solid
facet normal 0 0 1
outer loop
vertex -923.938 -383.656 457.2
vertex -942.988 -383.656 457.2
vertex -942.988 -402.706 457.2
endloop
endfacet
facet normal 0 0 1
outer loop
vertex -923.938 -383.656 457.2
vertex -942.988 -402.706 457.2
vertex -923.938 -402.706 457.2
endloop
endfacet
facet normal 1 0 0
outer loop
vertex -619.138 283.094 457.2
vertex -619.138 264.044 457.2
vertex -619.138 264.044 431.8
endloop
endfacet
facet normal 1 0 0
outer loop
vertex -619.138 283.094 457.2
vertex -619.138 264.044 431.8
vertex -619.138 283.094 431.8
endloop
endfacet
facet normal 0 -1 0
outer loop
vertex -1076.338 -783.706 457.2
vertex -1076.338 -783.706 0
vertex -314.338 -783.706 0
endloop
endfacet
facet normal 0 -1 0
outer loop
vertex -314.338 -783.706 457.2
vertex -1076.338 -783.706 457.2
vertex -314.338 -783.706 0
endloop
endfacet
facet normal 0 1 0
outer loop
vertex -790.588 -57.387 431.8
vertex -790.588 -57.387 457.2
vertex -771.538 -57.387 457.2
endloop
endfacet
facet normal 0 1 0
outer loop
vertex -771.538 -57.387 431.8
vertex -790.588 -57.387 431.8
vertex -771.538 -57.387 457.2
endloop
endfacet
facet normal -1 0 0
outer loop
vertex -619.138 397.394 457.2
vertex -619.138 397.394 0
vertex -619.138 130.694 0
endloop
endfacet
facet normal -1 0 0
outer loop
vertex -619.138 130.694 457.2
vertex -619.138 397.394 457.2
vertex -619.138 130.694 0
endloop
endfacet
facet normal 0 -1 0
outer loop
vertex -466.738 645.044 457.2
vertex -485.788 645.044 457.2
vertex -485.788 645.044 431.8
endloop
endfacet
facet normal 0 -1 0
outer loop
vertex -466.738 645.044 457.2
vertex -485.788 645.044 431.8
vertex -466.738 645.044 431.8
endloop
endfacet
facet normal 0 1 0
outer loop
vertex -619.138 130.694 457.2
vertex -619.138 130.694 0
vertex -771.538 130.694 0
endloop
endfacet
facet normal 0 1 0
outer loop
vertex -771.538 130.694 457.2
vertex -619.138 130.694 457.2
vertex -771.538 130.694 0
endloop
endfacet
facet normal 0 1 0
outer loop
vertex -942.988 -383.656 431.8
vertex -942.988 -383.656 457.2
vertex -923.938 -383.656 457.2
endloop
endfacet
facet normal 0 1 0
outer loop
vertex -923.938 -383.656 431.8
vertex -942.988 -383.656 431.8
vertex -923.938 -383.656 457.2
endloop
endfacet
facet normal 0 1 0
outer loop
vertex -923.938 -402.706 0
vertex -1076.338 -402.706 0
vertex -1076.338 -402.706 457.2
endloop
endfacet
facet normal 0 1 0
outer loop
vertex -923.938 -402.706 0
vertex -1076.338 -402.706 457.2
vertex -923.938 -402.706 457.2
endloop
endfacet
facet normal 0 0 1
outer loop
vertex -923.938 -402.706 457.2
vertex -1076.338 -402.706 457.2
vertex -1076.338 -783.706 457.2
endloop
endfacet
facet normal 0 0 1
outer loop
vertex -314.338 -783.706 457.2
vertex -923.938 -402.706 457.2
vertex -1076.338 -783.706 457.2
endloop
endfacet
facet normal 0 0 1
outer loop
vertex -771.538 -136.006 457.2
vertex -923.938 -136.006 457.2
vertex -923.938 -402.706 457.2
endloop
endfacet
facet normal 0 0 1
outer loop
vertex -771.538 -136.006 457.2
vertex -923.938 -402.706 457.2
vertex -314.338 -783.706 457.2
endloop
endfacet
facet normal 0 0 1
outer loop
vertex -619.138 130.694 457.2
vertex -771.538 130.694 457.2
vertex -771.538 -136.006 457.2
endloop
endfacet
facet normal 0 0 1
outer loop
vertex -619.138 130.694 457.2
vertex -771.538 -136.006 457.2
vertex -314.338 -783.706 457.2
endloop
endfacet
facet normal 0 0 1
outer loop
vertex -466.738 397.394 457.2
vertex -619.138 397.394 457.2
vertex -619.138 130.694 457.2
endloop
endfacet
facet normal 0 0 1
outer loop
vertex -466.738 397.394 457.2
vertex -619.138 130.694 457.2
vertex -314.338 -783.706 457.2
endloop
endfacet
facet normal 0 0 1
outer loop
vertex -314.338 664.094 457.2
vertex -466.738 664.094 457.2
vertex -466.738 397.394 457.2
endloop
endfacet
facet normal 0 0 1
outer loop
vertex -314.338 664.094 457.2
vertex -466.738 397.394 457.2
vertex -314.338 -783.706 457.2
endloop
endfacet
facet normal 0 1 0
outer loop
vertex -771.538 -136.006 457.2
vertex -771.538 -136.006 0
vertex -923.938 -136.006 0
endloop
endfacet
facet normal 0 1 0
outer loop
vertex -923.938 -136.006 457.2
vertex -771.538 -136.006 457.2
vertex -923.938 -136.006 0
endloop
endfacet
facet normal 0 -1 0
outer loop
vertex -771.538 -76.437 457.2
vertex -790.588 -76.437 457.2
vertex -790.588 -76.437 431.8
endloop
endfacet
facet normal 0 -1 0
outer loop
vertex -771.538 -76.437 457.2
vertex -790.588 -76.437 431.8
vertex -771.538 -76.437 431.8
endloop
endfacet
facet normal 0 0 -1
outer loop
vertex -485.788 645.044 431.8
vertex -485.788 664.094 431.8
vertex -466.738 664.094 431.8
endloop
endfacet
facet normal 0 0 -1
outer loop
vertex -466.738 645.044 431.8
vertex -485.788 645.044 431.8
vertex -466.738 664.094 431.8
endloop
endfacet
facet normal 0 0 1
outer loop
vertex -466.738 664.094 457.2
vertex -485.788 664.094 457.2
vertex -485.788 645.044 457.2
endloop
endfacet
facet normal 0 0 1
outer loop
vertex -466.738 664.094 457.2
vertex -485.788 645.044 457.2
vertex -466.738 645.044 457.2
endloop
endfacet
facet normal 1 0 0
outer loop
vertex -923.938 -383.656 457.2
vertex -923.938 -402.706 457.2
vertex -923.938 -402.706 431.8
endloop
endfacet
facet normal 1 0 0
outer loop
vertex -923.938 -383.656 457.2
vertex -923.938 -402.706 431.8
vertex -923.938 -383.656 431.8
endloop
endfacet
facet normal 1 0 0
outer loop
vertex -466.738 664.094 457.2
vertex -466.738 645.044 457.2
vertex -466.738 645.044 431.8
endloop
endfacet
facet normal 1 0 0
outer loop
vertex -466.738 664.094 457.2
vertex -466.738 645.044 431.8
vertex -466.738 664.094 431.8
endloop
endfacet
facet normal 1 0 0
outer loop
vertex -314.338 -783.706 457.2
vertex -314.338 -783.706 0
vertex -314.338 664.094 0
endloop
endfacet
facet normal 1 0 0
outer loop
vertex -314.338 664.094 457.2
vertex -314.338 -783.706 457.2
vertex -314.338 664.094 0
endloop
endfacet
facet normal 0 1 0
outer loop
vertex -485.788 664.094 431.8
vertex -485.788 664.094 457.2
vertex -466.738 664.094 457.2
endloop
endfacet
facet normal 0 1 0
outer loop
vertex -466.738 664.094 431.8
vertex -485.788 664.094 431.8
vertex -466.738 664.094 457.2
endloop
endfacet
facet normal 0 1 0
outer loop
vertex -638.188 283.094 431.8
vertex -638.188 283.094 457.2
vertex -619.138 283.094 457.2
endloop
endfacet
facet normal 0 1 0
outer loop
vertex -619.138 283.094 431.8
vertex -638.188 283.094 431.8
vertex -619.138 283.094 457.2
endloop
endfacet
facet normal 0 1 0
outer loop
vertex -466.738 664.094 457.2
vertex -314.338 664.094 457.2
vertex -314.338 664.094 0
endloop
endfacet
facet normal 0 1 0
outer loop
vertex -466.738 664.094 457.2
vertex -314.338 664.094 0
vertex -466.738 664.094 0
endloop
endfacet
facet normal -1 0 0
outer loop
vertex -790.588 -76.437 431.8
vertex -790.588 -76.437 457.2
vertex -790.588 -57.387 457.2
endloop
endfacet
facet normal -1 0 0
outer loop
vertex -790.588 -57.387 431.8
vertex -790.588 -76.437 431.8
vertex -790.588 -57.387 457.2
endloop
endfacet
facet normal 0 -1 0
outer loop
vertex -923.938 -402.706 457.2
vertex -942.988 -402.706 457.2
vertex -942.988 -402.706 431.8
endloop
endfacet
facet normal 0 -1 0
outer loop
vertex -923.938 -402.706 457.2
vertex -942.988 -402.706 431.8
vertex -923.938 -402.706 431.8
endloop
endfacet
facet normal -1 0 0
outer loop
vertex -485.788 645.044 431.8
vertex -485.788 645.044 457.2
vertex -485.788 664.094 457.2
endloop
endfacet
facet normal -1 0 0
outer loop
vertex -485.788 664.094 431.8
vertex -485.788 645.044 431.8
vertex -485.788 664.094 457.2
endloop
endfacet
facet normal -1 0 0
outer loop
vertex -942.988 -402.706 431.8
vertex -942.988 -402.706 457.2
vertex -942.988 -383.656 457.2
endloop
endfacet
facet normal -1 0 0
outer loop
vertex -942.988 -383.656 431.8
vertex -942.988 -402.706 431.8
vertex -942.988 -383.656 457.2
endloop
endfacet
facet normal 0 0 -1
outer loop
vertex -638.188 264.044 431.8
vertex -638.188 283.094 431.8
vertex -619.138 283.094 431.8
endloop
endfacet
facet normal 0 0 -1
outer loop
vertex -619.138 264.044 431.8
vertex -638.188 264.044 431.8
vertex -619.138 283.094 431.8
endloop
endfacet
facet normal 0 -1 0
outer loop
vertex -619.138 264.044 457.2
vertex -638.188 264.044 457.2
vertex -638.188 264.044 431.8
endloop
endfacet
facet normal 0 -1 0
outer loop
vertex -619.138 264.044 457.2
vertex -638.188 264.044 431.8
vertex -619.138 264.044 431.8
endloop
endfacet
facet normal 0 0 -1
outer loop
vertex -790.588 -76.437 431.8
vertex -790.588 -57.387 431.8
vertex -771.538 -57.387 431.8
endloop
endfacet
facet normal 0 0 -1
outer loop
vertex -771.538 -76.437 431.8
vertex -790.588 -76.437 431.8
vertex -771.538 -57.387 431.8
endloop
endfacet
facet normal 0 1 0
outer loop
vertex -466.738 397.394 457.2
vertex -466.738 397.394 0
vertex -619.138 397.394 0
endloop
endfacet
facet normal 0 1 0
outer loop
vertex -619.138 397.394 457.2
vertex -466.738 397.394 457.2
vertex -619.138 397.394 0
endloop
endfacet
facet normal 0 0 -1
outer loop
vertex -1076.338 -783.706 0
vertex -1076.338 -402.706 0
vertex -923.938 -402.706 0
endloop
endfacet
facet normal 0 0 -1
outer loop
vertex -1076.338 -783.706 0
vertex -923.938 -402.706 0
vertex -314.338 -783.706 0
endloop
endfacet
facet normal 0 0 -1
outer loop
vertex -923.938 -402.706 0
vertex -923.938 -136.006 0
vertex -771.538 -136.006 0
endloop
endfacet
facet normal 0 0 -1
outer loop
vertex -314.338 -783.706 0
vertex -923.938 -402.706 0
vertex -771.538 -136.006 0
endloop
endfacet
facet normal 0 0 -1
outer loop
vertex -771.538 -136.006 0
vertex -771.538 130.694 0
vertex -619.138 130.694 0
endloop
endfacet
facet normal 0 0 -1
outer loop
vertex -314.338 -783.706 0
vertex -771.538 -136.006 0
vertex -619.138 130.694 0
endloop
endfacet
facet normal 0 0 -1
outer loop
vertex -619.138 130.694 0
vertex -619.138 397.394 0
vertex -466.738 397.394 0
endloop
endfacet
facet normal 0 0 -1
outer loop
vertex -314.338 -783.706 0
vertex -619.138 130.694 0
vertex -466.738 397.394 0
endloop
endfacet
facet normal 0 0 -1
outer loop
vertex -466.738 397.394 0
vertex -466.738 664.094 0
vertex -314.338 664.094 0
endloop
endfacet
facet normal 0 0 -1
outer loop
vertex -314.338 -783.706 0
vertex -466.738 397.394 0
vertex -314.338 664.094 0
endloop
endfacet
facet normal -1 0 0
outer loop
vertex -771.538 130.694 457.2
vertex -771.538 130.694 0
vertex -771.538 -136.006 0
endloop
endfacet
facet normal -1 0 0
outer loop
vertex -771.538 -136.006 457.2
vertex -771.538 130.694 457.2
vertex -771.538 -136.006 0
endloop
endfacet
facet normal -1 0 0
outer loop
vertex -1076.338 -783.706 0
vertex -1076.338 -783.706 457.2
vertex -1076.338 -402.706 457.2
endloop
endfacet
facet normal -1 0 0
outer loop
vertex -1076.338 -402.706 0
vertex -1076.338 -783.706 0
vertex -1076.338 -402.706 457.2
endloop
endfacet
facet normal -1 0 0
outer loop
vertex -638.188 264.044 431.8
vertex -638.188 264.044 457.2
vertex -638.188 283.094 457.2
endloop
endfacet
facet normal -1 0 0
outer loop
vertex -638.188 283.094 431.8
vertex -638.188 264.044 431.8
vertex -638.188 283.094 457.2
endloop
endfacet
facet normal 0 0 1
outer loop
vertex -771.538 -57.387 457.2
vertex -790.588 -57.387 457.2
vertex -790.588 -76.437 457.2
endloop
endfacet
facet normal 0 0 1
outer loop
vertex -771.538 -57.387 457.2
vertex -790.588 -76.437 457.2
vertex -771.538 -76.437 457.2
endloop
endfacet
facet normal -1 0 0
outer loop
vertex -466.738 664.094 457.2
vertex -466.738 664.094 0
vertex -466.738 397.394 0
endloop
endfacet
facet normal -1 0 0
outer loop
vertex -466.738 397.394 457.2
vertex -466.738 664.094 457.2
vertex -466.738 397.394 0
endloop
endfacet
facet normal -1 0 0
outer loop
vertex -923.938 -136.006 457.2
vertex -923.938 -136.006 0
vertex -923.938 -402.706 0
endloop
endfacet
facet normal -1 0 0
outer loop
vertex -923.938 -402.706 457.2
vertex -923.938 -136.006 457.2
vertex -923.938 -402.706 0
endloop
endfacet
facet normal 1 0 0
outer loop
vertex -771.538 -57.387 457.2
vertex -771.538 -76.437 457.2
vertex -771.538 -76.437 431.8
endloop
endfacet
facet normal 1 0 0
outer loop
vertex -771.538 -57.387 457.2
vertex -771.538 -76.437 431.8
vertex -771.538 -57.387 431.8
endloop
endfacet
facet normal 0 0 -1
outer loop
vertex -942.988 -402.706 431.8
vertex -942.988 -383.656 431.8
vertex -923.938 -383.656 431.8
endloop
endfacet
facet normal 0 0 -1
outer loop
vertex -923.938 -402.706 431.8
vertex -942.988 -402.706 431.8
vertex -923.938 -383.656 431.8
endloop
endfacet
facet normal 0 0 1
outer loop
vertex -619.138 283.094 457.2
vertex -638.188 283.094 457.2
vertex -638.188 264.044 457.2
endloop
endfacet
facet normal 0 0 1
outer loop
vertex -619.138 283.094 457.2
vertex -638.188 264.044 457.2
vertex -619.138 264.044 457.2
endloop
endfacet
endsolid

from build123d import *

# Parameters (mm, degrees)
F0_W     = 152.4
F0_H     = 381
F1_DEPTH = 457.2
F2_W     = 19.05
F2_H     = 19.05
F3_DEPTH = 25.4


with BuildPart() as f1:
    # F0 (on Top) → F1 (new body)
    with BuildSketch(Plane.XY):
        Polygon((-466.7380232334, 397.3943232992), (-466.7380232334, -783.7056767008), (-314.3380232334, -783.7056767008), (-314.3380232334, 664.0943232992), (-466.7380232334, 664.0943232992), align=None)
        Polygon((-619.1380232334, 130.6943232992), (-619.1380232334, -783.7056767008), (-466.7380232334, -783.7056767008), (-466.7380232334, 397.3943232992), (-619.1380232334, 397.3943232992), align=None)
        Polygon((-771.5380232334, -136.0056767008), (-771.5380232334, -783.7056767008), (-619.1380232334, -783.7056767008), (-619.1380232334, 130.6943232992), (-771.5380232334, 130.6943232992), align=None)
        Polygon((-923.9380232334, -136.0056767008), (-923.9380232334, -402.7056767008), (-923.9380232334, -783.7056767008), (-771.5380232334, -783.7056767008), (-771.5380232334, -136.0056767008), align=None)
        with Locations((-1000.1380232334, -593.2056767008)):
            Rectangle(F0_W, F0_H)
    extrude(amount=F1_DEPTH)


with BuildPart() as f3:
    # F2 (on face) → F3 (new body)
    with BuildSketch(Plane.XY.offset(457.2)):
        with Locations((-933.4630232334, -393.1806767008)):
            Rectangle(F2_W, F2_H)
    extrude(amount=-F3_DEPTH)


with BuildPart() as f3b:
    # F2 (on face) → F3, piece 2 (new body)
    with BuildSketch(Plane.XY.offset(457.2)):
        with Locations((-781.0630232334, -66.9118548989)):
            Rectangle(F2_W, F2_H)
    extrude(amount=-F3_DEPTH)


with BuildPart() as f3c:
    # F2 (on face) → F3, piece 3 (new body)
    with BuildSketch(Plane.XY.offset(457.2)):
        with Locations((-628.6630232334, 273.5693232992)):
            Rectangle(F2_W, F2_H)
    extrude(amount=-F3_DEPTH)


with BuildPart() as f3d:
    # F2 (on face) → F3, piece 4 (new body)
    with BuildSketch(Plane.XY.offset(457.2)):
        with Locations((-476.2630232334, 654.5693232992)):
            Rectangle(F2_W, F2_H)
    extrude(amount=-F3_DEPTH)


solid = Compound([f1.part, f3.part, f3b.part, f3c.part, f3d.part])
